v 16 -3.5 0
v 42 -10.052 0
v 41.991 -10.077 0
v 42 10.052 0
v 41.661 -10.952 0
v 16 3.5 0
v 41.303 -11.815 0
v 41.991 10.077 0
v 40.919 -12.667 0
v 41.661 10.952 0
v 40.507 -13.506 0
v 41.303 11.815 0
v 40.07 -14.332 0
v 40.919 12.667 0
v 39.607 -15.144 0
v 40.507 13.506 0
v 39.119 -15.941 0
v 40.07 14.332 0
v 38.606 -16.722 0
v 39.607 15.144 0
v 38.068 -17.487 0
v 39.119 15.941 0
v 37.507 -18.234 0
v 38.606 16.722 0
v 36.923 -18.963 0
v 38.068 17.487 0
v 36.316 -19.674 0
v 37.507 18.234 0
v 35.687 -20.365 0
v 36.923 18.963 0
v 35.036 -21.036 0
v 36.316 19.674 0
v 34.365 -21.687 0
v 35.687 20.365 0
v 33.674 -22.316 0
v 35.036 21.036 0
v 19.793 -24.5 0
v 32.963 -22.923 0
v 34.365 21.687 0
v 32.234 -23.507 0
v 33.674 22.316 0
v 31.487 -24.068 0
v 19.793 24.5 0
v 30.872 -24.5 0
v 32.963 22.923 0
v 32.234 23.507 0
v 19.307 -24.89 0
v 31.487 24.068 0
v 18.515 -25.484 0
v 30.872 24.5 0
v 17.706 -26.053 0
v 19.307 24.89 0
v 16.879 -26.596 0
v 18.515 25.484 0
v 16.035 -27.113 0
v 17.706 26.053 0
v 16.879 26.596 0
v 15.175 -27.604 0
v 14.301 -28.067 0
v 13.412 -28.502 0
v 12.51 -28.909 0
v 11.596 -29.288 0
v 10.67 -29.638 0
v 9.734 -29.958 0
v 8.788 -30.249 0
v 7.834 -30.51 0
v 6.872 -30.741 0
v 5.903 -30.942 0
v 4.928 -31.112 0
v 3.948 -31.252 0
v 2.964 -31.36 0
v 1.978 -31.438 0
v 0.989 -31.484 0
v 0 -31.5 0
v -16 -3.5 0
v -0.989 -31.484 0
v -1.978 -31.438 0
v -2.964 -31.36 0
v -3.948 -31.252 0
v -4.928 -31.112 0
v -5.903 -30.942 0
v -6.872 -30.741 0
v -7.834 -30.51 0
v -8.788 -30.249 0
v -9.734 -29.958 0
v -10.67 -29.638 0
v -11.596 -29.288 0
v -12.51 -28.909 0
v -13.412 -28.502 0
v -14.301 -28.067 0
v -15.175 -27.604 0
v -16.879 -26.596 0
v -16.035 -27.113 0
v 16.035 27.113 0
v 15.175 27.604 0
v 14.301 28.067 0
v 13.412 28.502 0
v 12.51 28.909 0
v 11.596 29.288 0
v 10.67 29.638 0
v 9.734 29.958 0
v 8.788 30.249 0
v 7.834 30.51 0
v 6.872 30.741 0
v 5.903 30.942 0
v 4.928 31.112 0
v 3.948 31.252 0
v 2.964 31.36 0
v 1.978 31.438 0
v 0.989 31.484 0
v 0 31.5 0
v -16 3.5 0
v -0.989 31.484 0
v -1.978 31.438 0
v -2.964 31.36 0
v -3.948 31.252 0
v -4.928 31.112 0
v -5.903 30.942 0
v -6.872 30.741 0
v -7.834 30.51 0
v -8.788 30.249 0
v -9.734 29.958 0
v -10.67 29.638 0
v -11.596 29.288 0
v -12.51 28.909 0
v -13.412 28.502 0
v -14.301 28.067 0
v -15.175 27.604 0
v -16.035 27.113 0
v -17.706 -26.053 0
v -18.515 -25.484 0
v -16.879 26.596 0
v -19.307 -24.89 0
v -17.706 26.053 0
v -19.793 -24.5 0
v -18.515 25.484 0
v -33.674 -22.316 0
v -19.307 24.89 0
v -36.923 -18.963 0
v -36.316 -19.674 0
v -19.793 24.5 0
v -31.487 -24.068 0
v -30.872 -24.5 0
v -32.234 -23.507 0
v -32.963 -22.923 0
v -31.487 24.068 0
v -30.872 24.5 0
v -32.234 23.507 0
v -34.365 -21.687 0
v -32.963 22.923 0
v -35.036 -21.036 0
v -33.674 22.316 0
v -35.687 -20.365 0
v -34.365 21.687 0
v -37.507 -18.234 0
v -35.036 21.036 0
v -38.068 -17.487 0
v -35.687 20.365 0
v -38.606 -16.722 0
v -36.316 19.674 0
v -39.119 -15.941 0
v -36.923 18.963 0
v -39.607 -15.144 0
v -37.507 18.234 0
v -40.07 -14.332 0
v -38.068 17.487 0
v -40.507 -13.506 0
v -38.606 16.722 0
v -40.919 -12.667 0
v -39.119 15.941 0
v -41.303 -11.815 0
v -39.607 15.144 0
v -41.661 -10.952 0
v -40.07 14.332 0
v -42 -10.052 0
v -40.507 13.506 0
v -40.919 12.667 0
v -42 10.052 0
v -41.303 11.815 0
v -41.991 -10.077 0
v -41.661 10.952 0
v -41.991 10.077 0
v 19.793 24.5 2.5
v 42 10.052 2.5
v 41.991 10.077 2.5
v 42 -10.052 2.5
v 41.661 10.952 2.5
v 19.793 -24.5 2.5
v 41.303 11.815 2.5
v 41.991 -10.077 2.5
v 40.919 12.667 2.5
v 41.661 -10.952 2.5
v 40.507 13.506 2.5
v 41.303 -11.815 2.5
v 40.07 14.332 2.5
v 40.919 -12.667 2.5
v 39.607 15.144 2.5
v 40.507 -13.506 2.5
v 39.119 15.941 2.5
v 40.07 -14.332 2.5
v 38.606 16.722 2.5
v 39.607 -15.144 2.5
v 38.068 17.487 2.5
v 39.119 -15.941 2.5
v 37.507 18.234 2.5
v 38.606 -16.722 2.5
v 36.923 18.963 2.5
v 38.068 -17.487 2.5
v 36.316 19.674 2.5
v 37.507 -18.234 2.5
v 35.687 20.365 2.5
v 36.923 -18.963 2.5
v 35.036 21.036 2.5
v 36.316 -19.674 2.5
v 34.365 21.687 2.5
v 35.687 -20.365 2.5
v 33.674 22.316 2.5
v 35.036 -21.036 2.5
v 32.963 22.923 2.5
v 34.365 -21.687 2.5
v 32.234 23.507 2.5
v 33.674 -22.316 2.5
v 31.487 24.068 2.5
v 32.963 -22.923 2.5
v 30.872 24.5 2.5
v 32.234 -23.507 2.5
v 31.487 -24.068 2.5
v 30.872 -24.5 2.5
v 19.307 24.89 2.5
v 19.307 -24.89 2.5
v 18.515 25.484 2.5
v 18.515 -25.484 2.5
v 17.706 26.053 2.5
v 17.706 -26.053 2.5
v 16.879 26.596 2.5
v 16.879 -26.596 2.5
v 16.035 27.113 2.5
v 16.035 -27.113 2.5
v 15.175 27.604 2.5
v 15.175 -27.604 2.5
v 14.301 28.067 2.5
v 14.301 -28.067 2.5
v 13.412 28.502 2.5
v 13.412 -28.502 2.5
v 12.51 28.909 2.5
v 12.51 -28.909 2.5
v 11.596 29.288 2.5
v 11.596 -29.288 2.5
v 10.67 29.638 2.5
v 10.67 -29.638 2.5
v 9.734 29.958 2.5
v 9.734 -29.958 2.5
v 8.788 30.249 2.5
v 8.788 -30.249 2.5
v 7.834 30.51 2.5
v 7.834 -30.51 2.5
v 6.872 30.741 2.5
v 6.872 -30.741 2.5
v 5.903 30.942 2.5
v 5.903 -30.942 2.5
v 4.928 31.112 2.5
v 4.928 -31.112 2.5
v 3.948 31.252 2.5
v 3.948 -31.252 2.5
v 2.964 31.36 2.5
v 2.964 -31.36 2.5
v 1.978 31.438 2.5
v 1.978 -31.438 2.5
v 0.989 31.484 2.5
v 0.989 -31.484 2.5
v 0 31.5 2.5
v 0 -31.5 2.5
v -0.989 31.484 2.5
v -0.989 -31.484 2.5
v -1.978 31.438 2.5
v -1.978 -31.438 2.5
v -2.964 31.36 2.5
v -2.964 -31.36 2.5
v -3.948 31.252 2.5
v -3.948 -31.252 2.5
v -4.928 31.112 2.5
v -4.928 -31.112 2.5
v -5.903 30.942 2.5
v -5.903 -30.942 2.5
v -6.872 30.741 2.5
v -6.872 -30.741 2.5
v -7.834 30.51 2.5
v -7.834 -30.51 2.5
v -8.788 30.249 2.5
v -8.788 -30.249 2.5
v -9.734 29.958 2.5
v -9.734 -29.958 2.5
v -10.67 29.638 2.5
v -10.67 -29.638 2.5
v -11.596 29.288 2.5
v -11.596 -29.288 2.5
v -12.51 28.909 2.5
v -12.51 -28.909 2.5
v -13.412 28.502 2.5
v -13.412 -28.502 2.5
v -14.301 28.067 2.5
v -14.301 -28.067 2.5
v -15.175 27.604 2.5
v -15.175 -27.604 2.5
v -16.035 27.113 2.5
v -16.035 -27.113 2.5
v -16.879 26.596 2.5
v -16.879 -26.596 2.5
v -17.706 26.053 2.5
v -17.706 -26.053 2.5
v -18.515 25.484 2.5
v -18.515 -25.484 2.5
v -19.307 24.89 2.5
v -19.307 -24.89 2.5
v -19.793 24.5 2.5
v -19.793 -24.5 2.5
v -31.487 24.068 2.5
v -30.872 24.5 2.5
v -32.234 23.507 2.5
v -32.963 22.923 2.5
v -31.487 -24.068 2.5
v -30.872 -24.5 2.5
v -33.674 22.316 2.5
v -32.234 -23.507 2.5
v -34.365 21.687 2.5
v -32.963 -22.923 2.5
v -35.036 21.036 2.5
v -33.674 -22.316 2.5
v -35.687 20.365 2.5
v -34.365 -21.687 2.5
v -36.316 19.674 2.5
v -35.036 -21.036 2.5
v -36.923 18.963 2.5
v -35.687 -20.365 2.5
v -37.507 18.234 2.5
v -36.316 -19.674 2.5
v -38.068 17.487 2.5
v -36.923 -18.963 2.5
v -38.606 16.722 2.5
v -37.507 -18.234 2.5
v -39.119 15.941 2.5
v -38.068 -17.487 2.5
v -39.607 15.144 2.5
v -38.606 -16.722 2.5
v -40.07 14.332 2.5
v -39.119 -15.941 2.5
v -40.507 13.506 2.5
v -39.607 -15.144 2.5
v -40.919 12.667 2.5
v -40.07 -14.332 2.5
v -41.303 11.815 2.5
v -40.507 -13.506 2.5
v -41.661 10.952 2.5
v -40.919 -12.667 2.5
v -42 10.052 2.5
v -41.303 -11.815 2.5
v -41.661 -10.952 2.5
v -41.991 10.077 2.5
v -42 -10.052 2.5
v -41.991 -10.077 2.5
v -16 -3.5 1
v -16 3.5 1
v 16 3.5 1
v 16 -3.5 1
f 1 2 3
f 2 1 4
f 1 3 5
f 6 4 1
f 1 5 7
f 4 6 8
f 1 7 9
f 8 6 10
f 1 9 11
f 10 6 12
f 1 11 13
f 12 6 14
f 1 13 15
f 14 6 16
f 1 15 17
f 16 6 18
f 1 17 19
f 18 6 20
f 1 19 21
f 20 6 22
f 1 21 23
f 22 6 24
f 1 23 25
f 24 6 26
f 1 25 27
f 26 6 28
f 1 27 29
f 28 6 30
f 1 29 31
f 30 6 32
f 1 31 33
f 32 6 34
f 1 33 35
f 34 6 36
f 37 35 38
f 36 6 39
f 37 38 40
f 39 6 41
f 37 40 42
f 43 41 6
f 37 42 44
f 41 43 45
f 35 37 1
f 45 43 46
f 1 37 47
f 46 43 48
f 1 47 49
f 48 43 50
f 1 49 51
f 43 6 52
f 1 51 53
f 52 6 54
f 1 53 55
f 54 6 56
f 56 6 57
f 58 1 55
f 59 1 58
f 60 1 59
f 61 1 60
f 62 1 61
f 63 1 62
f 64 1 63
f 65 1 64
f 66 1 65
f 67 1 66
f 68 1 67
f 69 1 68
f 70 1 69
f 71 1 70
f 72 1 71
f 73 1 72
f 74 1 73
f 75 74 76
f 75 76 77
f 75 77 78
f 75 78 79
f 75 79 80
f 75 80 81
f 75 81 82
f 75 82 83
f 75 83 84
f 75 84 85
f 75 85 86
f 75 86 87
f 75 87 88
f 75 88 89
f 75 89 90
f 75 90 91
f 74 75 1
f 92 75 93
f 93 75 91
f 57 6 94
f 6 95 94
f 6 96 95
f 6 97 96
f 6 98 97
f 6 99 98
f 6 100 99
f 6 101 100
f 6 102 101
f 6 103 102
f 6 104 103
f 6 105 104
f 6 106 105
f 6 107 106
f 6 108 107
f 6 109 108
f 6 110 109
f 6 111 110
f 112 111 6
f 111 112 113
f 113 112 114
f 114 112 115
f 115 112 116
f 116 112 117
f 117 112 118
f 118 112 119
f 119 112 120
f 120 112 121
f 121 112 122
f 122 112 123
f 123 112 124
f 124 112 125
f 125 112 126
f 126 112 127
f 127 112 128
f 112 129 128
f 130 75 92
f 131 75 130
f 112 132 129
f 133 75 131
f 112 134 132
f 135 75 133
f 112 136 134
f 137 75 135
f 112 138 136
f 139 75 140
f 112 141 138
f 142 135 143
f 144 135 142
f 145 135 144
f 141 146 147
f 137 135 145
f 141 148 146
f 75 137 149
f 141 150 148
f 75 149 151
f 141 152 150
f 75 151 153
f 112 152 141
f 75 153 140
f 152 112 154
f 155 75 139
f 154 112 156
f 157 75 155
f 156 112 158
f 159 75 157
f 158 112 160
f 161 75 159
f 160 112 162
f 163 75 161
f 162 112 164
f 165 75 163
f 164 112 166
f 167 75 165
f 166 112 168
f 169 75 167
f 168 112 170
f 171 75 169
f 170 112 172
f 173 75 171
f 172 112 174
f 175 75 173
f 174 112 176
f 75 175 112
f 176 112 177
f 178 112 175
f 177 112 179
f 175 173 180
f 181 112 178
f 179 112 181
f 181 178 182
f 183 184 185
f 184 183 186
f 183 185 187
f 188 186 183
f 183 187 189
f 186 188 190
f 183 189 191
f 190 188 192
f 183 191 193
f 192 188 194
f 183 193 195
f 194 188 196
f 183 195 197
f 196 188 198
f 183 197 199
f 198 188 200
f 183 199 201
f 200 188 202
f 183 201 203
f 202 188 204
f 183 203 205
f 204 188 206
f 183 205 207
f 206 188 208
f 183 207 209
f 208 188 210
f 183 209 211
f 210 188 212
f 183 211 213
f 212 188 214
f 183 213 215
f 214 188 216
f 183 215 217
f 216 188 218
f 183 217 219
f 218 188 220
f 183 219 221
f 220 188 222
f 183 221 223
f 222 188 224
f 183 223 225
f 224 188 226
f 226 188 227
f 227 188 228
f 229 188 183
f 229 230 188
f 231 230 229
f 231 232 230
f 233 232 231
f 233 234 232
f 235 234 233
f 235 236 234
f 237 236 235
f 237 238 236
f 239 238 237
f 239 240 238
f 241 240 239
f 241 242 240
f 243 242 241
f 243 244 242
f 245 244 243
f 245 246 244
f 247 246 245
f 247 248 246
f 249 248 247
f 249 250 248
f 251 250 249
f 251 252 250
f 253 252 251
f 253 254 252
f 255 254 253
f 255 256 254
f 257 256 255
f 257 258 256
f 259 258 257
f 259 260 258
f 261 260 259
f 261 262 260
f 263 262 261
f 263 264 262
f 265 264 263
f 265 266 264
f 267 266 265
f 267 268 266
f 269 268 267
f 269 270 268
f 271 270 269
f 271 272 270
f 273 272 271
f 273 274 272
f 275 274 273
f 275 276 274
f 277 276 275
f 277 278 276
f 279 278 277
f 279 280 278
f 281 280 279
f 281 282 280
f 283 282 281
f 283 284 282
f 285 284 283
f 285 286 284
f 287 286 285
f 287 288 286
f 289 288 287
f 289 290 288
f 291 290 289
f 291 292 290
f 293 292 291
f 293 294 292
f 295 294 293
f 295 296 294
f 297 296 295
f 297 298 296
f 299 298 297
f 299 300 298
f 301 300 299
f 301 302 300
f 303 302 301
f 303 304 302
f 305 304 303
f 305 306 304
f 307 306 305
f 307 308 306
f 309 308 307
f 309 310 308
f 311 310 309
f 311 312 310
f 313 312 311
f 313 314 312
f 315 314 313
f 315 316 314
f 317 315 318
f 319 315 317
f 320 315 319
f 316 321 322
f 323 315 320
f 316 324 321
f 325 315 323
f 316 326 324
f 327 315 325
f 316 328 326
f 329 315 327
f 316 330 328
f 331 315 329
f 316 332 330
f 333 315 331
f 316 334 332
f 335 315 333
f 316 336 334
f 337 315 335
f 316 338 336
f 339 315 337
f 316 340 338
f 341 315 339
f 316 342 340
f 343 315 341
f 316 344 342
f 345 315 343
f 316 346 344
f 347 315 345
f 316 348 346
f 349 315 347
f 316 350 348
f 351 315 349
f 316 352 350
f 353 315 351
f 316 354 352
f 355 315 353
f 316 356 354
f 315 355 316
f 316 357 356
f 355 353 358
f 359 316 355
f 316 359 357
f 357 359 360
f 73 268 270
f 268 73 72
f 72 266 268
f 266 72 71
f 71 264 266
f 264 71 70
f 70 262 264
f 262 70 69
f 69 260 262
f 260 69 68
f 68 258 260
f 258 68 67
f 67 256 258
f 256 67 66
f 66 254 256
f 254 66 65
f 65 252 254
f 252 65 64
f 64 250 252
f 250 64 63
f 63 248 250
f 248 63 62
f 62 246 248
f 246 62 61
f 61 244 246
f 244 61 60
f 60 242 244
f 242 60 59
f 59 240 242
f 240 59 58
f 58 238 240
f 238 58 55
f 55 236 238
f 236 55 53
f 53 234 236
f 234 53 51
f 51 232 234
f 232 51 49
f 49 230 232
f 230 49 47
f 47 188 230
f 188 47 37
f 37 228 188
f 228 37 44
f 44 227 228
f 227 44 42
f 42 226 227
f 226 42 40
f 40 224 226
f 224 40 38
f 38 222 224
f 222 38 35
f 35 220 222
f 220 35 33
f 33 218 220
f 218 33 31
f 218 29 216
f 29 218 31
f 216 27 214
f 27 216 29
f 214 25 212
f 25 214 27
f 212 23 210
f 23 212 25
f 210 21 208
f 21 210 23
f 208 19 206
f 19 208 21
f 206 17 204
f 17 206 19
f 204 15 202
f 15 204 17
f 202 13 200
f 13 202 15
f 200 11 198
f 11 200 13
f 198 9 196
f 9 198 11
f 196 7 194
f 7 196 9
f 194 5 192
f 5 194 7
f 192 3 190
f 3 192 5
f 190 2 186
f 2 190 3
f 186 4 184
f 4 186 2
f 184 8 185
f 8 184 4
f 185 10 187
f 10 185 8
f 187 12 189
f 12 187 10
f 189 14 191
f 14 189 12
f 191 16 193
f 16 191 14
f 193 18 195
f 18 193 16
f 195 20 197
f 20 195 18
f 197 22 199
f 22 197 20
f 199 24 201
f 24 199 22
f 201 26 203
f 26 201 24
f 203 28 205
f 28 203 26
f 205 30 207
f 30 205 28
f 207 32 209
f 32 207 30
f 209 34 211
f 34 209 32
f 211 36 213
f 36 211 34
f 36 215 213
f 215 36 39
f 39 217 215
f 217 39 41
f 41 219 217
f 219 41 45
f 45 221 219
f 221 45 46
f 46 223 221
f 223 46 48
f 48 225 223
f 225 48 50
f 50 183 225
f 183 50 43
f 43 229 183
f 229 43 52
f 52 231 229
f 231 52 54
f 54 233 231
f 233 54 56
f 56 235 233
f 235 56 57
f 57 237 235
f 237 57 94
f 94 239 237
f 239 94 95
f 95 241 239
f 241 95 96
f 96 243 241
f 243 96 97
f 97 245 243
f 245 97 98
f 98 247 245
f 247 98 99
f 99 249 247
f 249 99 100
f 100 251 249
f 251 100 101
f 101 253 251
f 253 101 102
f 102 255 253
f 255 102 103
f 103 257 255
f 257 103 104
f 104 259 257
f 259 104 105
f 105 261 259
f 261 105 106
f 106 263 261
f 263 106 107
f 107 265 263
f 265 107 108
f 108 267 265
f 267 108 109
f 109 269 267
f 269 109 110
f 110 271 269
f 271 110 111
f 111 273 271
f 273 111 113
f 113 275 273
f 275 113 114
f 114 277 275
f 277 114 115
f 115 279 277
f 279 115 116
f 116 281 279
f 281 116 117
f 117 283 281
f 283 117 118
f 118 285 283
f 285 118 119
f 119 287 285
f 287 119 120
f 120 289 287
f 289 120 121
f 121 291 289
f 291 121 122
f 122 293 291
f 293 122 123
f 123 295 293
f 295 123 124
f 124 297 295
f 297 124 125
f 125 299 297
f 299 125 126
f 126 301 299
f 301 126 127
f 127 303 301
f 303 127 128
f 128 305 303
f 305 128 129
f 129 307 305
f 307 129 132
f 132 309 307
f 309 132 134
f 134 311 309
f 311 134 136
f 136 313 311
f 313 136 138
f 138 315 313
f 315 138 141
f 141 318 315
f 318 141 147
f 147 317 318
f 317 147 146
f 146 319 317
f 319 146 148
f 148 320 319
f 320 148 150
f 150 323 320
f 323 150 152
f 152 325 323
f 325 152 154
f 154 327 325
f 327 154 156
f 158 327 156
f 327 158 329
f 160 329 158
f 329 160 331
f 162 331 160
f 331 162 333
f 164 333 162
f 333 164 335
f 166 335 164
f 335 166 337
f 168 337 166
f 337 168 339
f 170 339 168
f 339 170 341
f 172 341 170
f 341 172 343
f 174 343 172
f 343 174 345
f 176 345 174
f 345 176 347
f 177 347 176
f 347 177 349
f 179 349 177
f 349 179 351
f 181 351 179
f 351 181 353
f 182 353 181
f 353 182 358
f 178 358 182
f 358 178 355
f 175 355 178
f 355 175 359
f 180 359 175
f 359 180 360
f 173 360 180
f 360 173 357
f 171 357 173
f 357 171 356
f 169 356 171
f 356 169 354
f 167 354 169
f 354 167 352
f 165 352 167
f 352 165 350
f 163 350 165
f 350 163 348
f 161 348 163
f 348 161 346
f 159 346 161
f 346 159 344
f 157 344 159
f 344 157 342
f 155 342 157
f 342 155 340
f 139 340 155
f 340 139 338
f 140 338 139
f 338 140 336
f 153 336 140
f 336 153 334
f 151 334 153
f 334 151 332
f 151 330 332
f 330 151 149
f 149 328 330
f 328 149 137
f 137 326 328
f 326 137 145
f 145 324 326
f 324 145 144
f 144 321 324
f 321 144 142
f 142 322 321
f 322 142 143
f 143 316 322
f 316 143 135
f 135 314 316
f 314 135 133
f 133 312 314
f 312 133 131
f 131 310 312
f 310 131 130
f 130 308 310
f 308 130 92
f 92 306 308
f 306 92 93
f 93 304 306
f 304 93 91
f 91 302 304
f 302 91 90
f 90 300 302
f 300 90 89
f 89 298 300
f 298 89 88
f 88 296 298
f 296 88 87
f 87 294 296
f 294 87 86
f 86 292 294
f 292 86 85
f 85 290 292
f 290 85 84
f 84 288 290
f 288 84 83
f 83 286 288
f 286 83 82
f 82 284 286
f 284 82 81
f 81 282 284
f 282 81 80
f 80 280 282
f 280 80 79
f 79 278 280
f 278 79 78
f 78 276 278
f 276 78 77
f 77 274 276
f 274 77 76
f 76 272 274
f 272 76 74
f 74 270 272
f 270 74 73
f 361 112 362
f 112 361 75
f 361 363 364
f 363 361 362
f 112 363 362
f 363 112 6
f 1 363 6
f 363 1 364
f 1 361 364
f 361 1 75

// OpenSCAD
$fn=200;
module create_first_shape()
{
    intersection()
    {
        translate([20,0])circle(d=85);
        translate([30,0])square([60, 70], center=true);
    }   
}

module create_brooch_indent(width, height)
{
    translate([0,0,-1])
    color("#dc143c")
    linear_extrude(2)
    square([width, height], center=true);
}

module create_base_plate(
    thickness, 
    scale_factor=1)
{
    difference()
    {
        linear_extrude(thickness)
        scale([scale_factor, 
               scale_factor,
               scale_factor])
        union()
        {
            create_first_shape();
            mirror([1,0,0])create_first_shape();
            circle(d=90);
        }
        create_brooch_indent(32, 7);
    }
}

create_base_plate(2.5, 0.7);
